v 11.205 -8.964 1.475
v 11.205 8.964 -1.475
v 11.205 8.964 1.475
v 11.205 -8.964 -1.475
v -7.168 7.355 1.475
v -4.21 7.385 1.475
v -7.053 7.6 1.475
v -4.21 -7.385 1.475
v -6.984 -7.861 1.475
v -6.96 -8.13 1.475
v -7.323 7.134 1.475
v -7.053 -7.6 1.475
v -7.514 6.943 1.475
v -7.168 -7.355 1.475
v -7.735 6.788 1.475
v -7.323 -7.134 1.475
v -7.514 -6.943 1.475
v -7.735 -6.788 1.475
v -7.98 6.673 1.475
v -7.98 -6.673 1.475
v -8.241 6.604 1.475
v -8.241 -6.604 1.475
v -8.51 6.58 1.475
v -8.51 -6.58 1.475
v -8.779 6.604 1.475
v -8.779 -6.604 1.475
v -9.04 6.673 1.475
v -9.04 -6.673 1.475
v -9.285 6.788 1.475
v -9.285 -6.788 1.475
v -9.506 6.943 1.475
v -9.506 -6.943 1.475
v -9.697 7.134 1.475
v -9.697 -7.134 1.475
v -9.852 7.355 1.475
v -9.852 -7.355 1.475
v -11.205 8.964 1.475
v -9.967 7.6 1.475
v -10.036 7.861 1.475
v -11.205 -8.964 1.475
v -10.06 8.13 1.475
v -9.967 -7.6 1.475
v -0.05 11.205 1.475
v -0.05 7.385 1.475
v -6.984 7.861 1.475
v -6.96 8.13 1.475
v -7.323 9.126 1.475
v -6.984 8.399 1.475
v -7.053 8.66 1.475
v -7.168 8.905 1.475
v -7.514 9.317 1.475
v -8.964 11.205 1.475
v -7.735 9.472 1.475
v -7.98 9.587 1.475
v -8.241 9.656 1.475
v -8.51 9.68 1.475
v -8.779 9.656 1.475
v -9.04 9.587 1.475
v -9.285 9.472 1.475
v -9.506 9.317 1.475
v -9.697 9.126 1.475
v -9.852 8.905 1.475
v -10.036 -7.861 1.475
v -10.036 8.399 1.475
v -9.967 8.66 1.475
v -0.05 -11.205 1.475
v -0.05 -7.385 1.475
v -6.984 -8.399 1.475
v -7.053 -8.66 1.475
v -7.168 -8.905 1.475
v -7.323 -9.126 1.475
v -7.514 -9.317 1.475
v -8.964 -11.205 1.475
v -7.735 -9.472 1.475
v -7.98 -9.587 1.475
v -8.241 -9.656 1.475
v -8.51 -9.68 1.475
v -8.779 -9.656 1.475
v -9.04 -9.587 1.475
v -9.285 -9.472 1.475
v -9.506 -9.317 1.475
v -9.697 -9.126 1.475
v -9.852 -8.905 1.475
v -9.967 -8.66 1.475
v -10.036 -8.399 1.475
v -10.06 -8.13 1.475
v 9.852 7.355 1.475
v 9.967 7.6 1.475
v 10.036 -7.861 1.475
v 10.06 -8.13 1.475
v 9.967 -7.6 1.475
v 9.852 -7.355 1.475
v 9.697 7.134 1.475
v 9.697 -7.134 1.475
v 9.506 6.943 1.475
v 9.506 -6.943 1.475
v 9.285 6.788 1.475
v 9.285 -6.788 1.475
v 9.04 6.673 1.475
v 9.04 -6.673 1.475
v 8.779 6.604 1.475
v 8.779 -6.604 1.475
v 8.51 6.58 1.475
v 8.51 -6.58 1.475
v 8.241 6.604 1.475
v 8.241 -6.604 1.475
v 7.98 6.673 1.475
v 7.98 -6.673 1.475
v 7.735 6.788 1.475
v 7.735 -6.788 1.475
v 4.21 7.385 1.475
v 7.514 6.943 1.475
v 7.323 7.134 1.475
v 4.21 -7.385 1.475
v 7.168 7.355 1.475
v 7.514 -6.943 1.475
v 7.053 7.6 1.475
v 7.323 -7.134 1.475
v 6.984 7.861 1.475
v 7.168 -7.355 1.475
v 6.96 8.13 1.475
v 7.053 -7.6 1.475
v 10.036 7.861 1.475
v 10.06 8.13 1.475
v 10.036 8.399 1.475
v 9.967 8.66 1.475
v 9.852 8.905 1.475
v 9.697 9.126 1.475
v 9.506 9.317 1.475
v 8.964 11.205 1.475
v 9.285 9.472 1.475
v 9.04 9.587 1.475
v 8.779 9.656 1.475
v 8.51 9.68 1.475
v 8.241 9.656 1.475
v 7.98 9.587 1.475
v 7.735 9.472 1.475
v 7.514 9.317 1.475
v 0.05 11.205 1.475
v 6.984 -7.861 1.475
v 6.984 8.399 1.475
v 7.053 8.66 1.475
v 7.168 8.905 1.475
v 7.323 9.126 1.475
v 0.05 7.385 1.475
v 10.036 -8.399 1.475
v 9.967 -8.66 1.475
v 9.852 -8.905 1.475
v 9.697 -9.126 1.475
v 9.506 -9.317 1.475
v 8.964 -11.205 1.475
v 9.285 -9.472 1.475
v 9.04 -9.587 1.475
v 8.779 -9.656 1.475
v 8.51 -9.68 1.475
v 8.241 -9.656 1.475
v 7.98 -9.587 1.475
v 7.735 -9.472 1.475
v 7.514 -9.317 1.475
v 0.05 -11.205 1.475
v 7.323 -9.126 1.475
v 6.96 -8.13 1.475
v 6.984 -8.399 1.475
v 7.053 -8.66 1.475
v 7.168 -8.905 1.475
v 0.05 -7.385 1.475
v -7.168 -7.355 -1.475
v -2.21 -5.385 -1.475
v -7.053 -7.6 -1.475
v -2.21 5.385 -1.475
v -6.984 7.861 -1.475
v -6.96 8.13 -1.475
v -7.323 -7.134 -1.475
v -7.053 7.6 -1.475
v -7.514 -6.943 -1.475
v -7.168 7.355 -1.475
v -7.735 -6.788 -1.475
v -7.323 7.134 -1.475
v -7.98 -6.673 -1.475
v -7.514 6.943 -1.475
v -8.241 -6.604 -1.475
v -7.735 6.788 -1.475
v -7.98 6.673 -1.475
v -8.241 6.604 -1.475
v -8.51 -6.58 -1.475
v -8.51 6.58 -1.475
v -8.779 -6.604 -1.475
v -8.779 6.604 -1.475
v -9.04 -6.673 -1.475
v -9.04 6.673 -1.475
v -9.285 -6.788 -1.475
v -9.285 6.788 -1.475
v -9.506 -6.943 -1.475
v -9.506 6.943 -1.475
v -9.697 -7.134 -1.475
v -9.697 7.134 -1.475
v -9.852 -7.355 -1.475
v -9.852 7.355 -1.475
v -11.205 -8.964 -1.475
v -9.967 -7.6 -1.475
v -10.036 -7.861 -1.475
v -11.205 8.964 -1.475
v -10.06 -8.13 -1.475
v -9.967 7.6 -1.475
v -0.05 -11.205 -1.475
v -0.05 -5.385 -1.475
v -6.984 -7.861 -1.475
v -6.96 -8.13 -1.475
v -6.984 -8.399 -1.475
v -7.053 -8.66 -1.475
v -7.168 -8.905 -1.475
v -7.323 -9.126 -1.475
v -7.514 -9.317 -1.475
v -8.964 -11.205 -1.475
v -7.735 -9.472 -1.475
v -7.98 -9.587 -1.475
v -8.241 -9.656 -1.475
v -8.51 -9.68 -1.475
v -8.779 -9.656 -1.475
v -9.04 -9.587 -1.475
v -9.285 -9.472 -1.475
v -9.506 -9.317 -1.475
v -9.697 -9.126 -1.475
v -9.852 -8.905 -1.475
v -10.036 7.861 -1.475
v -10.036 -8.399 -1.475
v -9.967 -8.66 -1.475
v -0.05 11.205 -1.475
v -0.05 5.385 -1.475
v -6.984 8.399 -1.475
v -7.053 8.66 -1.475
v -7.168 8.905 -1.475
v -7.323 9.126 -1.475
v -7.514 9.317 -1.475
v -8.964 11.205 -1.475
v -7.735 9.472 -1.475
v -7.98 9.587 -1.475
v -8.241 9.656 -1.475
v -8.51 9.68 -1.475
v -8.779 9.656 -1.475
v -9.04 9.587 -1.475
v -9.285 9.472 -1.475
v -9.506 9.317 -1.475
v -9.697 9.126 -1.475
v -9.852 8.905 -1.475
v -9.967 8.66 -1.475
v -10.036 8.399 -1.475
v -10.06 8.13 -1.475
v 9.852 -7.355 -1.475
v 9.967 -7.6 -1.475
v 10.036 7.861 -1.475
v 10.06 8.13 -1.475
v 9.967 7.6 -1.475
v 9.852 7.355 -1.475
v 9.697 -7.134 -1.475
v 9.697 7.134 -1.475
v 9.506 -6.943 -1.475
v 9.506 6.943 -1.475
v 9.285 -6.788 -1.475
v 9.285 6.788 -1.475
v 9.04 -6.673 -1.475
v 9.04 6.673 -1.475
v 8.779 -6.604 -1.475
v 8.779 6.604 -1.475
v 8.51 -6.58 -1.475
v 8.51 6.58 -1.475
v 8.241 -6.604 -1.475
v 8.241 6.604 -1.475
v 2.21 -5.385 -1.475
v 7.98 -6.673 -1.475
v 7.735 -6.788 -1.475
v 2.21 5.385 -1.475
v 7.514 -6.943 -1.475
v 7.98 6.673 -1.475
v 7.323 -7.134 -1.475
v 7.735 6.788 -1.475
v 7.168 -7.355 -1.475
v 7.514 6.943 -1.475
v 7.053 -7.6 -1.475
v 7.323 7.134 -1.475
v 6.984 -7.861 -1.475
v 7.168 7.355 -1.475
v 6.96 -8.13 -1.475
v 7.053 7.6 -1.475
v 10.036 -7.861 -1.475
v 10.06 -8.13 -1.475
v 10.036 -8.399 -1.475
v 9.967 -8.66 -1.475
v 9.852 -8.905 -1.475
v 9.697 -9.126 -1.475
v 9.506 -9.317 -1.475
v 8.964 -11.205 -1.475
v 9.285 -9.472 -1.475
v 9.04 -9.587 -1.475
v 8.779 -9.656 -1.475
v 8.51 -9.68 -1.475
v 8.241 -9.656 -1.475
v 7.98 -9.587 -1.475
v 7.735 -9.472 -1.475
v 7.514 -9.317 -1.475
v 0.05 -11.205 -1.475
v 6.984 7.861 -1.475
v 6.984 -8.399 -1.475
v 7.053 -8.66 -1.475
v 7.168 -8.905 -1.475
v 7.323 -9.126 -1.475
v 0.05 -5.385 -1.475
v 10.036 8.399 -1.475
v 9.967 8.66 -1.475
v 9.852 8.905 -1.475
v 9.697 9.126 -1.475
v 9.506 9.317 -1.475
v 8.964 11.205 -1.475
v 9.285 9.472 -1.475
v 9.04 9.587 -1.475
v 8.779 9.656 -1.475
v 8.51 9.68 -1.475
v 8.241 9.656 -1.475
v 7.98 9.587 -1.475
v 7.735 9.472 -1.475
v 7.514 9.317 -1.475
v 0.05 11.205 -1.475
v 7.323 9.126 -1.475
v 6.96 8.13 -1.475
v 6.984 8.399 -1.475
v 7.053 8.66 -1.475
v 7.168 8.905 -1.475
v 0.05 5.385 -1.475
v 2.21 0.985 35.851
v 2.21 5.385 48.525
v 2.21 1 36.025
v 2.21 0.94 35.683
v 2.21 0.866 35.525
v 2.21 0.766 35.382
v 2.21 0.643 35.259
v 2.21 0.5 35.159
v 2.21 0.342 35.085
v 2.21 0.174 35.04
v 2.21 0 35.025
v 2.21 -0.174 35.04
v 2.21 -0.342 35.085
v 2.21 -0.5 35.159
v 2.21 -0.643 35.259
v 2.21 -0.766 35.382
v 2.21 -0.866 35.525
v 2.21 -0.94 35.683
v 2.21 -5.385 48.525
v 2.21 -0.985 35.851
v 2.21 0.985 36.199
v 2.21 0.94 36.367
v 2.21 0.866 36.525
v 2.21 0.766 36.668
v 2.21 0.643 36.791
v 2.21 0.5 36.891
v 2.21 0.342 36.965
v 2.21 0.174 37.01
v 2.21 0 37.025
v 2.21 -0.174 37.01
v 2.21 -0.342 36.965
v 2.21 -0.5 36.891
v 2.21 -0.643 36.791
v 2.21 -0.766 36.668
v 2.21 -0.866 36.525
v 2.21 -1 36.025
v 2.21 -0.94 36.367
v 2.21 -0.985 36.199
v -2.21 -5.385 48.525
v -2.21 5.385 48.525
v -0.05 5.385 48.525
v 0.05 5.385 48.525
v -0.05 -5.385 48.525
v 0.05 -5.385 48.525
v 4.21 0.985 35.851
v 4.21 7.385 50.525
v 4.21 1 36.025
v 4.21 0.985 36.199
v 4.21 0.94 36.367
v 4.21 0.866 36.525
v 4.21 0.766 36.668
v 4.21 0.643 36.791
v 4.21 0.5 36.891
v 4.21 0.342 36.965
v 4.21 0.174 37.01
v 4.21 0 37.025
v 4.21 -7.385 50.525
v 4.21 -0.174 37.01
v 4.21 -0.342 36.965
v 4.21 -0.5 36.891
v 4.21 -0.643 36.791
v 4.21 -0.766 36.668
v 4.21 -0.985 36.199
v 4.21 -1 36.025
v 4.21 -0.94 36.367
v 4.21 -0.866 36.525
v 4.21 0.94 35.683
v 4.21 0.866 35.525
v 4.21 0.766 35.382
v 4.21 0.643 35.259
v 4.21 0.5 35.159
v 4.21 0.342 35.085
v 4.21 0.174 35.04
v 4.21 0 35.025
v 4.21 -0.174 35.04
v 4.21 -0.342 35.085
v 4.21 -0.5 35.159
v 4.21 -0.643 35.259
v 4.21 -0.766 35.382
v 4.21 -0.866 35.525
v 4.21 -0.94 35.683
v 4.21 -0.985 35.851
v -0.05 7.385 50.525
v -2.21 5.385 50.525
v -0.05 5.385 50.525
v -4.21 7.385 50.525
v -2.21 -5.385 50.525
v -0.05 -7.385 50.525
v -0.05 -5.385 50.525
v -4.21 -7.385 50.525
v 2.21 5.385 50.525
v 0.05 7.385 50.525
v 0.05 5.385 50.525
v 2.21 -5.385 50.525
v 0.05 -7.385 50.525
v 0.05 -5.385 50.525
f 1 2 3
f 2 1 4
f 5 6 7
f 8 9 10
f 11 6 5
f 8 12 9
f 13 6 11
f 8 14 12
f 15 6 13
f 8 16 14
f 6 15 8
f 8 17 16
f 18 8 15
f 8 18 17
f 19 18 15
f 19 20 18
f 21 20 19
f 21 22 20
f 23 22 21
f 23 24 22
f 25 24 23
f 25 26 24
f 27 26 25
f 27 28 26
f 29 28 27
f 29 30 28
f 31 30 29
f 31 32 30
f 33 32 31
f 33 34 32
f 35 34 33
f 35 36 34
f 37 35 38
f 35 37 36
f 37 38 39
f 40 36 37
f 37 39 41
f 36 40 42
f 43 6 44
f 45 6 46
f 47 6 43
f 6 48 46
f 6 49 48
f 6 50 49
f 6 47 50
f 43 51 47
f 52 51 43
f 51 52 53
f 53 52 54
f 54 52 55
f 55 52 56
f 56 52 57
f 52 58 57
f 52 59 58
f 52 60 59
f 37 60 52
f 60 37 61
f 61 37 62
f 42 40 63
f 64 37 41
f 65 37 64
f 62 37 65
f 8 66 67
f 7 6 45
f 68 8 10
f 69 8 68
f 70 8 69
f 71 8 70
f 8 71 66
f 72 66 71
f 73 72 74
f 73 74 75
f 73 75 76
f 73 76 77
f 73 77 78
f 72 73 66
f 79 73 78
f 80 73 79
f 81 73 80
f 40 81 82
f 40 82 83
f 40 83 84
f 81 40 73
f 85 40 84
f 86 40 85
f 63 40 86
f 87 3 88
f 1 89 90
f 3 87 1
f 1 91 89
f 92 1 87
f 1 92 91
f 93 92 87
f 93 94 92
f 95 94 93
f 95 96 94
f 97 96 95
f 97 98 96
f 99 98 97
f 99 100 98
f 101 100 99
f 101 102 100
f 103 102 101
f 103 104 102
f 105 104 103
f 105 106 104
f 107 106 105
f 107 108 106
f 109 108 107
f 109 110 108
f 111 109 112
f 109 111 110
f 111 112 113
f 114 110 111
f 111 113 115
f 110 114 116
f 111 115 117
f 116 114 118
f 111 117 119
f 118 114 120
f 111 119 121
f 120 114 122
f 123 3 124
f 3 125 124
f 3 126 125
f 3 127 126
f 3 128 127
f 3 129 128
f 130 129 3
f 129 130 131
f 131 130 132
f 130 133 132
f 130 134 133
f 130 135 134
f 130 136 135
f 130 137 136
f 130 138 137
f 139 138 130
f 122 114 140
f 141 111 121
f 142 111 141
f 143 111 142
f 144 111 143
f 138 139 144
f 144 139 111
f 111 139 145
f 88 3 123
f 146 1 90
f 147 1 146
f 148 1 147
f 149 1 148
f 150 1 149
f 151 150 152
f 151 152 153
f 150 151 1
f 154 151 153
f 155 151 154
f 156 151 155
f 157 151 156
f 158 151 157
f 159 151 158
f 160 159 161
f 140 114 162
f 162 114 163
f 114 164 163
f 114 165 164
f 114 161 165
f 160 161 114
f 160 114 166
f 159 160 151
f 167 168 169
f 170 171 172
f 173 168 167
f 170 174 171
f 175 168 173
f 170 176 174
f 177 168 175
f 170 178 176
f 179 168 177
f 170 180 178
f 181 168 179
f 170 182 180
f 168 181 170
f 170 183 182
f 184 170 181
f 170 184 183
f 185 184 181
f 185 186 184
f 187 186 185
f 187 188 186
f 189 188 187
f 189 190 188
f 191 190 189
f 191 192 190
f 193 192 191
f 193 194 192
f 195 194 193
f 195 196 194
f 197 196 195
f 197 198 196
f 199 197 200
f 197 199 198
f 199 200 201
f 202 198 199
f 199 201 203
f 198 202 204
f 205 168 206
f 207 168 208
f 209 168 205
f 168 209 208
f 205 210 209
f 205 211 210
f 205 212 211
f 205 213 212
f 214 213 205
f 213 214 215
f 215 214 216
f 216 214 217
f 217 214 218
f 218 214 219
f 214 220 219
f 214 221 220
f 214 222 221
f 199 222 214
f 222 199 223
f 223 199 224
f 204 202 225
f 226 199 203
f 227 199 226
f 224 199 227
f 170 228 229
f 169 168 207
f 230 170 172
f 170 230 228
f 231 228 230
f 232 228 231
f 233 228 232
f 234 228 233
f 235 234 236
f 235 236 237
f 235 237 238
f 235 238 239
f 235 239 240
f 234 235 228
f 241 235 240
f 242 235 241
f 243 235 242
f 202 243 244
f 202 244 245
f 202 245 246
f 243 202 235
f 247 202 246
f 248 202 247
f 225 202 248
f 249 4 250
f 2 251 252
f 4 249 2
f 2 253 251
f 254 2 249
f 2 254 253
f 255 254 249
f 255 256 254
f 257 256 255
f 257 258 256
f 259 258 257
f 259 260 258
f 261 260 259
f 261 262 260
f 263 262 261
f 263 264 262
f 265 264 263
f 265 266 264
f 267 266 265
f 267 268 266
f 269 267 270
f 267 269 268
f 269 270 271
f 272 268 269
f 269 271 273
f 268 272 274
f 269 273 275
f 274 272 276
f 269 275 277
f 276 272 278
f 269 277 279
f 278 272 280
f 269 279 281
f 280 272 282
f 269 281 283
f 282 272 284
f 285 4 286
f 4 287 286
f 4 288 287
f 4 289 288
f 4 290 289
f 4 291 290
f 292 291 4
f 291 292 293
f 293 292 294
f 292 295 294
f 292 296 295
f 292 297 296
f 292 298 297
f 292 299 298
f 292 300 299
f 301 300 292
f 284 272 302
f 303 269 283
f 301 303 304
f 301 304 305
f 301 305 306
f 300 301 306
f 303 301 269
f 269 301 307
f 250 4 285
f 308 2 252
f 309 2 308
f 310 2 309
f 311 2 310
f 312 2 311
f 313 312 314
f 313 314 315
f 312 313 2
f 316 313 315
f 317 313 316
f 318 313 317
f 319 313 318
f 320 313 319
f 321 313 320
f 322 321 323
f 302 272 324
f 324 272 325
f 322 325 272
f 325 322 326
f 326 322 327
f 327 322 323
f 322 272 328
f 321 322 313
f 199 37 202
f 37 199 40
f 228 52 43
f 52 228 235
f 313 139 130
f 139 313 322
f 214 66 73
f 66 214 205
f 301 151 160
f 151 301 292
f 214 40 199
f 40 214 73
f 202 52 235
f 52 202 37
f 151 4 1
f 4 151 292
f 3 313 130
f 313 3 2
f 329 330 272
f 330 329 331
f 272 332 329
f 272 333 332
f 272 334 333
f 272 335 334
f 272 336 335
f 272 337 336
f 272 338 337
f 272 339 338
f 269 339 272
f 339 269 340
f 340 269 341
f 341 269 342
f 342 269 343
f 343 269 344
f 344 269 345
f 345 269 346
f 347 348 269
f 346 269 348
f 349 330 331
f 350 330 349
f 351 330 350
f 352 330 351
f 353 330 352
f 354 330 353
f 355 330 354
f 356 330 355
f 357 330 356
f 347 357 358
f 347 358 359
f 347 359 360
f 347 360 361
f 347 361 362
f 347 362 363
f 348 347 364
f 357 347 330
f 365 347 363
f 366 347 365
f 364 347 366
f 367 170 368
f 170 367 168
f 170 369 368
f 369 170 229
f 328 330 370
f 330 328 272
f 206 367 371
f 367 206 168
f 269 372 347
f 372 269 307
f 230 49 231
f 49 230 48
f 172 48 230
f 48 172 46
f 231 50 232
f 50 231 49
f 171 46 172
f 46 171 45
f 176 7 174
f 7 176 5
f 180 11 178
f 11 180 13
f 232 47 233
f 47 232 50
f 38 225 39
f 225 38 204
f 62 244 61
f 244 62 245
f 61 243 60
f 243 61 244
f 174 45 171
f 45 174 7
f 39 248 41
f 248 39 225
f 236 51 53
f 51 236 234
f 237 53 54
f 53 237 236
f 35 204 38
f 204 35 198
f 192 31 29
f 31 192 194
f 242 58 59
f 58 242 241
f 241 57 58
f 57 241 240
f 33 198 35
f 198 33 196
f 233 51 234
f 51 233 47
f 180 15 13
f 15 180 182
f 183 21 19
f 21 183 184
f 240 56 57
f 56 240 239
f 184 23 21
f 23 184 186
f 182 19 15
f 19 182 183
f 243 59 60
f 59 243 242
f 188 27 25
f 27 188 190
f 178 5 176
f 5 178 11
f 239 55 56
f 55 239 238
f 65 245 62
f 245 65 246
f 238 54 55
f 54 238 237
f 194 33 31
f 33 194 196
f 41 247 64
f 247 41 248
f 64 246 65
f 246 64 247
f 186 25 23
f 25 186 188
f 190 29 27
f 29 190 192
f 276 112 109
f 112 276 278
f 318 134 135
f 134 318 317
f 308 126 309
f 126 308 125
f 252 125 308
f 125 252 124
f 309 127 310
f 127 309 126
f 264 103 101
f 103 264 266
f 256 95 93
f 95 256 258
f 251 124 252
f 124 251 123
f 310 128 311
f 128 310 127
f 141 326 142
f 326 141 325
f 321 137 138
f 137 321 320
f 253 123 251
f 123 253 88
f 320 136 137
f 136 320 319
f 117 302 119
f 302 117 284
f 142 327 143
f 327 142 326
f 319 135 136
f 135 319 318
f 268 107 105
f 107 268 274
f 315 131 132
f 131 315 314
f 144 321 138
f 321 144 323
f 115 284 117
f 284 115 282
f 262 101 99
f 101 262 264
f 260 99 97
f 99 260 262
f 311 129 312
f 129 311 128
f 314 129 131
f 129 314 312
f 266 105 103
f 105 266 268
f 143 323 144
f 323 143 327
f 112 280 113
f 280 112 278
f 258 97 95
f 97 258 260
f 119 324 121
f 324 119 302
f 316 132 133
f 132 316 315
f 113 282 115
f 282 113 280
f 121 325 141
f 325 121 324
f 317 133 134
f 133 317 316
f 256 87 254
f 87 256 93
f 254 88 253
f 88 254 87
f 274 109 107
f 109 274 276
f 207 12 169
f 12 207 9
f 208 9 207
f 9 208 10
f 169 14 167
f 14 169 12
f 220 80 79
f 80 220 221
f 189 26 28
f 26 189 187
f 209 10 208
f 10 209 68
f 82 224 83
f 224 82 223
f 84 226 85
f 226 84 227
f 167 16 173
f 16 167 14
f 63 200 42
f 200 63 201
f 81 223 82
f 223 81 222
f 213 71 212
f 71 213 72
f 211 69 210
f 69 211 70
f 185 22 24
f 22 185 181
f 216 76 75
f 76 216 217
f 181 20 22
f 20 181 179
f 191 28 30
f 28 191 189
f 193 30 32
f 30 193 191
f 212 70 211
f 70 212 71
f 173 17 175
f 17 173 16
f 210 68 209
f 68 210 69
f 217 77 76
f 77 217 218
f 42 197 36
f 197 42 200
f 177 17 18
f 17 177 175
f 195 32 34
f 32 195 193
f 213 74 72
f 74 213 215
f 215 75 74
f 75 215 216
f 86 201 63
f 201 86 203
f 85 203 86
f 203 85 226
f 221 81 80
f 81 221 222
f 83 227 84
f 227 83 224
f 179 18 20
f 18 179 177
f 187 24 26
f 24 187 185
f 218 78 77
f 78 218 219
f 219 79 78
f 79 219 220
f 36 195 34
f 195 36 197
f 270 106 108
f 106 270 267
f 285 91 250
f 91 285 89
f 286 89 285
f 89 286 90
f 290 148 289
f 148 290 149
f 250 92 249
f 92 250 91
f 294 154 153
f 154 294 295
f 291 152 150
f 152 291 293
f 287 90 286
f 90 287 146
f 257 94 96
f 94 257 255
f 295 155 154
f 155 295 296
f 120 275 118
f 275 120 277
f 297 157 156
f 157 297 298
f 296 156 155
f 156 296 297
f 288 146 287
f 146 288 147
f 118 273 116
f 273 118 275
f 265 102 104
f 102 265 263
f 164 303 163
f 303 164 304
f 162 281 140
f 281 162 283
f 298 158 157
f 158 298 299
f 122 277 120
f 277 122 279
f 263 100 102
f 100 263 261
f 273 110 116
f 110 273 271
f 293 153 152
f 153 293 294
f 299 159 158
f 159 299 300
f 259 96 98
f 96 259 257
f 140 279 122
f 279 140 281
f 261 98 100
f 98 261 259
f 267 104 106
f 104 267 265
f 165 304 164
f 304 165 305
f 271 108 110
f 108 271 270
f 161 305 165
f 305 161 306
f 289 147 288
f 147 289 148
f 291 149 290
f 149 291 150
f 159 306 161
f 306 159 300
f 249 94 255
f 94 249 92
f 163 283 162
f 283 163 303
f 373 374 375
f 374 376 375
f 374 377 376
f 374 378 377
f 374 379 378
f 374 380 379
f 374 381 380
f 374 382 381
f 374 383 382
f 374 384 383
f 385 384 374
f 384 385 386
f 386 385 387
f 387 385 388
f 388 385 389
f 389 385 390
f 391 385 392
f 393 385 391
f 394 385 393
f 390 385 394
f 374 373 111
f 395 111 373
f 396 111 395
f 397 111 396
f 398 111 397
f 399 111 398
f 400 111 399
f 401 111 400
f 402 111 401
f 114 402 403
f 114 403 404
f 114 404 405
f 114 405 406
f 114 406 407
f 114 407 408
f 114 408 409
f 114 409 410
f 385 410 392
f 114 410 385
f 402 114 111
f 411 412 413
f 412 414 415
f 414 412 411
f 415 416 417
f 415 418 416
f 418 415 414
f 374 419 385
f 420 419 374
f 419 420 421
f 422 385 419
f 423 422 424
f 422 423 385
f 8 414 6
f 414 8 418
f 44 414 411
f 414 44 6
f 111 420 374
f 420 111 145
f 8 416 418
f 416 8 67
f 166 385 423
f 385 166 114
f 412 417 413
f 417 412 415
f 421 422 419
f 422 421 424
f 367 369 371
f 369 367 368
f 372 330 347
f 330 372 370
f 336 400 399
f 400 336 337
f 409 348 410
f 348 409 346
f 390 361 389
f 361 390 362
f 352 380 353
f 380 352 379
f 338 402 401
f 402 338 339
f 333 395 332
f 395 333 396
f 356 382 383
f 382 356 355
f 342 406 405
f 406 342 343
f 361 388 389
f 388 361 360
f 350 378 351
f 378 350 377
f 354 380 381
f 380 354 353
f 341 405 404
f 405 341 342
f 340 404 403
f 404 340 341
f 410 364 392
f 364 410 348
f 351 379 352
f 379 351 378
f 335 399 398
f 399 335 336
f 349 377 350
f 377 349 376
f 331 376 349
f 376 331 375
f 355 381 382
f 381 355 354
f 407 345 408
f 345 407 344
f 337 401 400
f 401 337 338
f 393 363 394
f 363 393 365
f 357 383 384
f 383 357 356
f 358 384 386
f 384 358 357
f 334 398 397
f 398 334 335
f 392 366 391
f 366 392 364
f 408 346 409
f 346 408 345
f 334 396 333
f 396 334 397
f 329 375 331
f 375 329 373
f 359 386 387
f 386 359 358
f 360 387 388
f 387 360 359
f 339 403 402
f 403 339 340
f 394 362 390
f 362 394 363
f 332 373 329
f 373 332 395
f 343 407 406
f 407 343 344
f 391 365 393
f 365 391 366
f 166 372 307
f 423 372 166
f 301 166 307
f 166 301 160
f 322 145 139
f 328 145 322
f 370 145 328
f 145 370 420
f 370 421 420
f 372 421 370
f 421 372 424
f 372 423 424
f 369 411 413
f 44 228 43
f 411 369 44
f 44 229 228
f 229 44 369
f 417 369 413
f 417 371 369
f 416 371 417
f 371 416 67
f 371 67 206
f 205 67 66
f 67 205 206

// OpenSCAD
// file: common.scad
/**********************************************************************
 * Common waveguide code                                              *
 * NOTE: Must be included AFTER setting waveguide parameters          *
 * Perhaps in the future it could be useful to allow passing in these *
 * parameters to the modules themselves, removing this requirement.   *
 **********************************************************************/


/*             WR112   WR90   WR75   WR62   WR51   WR42   WR34  WR28 */
wrtab    = [0, 112,    90,    75,    62,    51,    42,    34,   28   ]*1.0; /* Waveguide type */
fstab    = [0,  47.9,  41.4,  38.3,  33.3,  31.0,  22.41, 22.1, 19.05]*1.0; /* Flange size */
fhstab   = [0,  18.72, 16.26, 14.25, 12.14, 11.25,  8.51,  7.9,  6.73]*1.0; /* Hole spacing short side */
fhltab   = [0,  17.17, 15.49, 13.21, 12.63, 10.29,  8.13,  7.5,  6.34]*1.0; /* Hole spacing long side */
drilltab = [0,   4.3,   4.3,   4.1,   4.1,   4.1,   3.1,   3.1,  3.0 ]*1.0; /* Hole size */
/* Not all waveguide opening sizes correspong 100% to the waveguide number */
wgatab   = [0,  28.50, 22.86, 19.05, 15.80, 12.95, 10.67,  8.64, 7.11]*1.0; /* Waveguide opening size A */
wgbtab   = [0,  12.62, 10.16,  9.53,  7.90,  6.48,  4.32,  4.32, 3.56]*1.0; /* Waveguide opening size B */


flange_size   = fstab[wrcode];        /* Square size of flange */
flange_hole_s = fhstab[wrcode];       /* Hole spacing on short side */
flange_hole_l = fhltab[wrcode];       /* Hole spacing on long side */
flange_drill  = drilltab[wrcode]/2.0; /* Flange mounting hole size */

wgsize_a = wgatab[wrcode] + (trim * 2);
wgsize_b = wgbtab[wrcode] + (trim * 2);

// faces for precision
$fn=36; // faces for precision

/* Create a waveguide flange
 *   Heavily based on code from Rolf-Dieter Klein (www.rdklein.de)
 *   https://www.thingiverse.com/thing:161428
 */
module flange() {
    thickness = flanged - trim;

    difference() {
        difference() {
            intersection() {
                cube([flange_size, flange_size, thickness], center=true);
                rotate([0,0,45])
                    cube([flange_size*1.4142*0.9,flange_size*1.4142*0.9,thickness],center=true);
            }
            cube([wgsize_b,wgsize_a,wall*2],center=true);
        }
        /* Holes */
        translate([-flange_hole_s,  flange_hole_l, 0]) cylinder(h=thickness*1.1, r=flange_drill, center=true);
        translate([ flange_hole_s,  flange_hole_l, 0]) cylinder(h=thickness*1.1, r=flange_drill, center=true);
        translate([-flange_hole_s, -flange_hole_l, 0]) cylinder(h=thickness*1.1, r=flange_drill, center=true);
        translate([ flange_hole_s, -flange_hole_l, 0]) cylinder(h=thickness*1.1, r=flange_drill, center=true);
    }
}

/* Create a flangeless section of waveguide
 *   wg_len: Length of section, in mm
 */
module waveguide(wg_len) {
    translate([0,0,wg_len/2]) {
        difference() {
            cube([wgsize_b+wall*2, wgsize_a+wall*2, wg_len],          center=true);
            cube([wgsize_b,        wgsize_a,        wg_len + wall*.1],center=true);
        }
    }
}

/* Generate horn antenna
 *   length:  Length of horn
 *   theta_h: Angle of horn in magnetic field
 *   theta_e: Angle of horn in electric field
 *
 * Polyhedron code loosely based off of code from Rolf-Dieter Klein (www.rdklein.de)
 *   https://www.thingiverse.com/thing:161428
 */
module horn(length, theta_h, theta_e) {
    /* Depth of horn that ends up inside waveguide */
    d_a = wgsize_a / (2 * tan(theta_h));
    d_b = wgsize_b / (2 * tan(theta_e));

    /* Size of horn opening */
    sz_a = wgsize_a + (2 * length * tan(theta_h));
    sz_b = wgsize_b + (2 * length * tan(theta_e));

    difference() {
        polyhedron(
            points = [
                /* Wide end */
                [ sz_b/2 + wall,  sz_a/2 + wall, length],
                [ sz_b/2 + wall, -sz_a/2 - wall, length],
                [-sz_b/2 - wall, -sz_a/2 - wall, length],
                [-sz_b/2 - wall,  sz_a/2 + wall, length],
                /* Small end */
                [ wgsize_b/2 + wall,  wgsize_a/2 + wall, 0],
                [ wgsize_b/2 + wall, -wgsize_a/2 - wall, 0],
                [-wgsize_b/2 - wall, -wgsize_a/2 - wall, 0],
                [-wgsize_b/2 - wall,  wgsize_a/2 + wall, 0]
            ],
            faces = [
                [0,1,4],[1,2,5],[2,3,6],[3,0,7],
                [1,5,4],[2,6,5],[3,7,6],[0,4,7],
                [1,0,3],[2,1,3],[4,5,7],[5,6,7]
            ]
        );
        polyhedron(
            points = [
                /* Wide end */
                [ sz_b/2,  sz_a/2, length],
                [ sz_b/2, -sz_a/2, length],
                [-sz_b/2, -sz_a/2, length],
                [-sz_b/2,  sz_a/2, length],
                /* Small end */
                [ wgsize_b/2,  wgsize_a/2, 0],
                [ wgsize_b/2, -wgsize_a/2, 0],
                [-wgsize_b/2, -wgsize_a/2, 0],
                [-wgsize_b/2,  wgsize_a/2, 0]
            ],
            faces = [
                [0,1,4],[1,2,5],[2,3,6],[3,0,7],
                [1,5,4],[2,6,5],[3,7,6],[0,4,7],
                [1,0,3],[2,1,3],[4,5,7],[5,6,7]
            ]
        );
    }
}

/* Generate an ideal horn antenna for a given wavelength
 *   l_h: Length of horn in magnetic field direction
 *   l_e: Length of horn in electric field direction
 *   wavelength: Design wavelength
 *
 * Both l_h and l_e include the portion of the antenna that would end up inside
 * the waveguide if both sides of the horn were extended until they meet.
 */
module ideal_horn(l_h, l_e, wavelength) {
    theta_e = asin(sqrt(2 * wavelength * l_e) / (2 * l_e));
    theta_h = asin(sqrt(3 * wavelength * l_h) / (2 * l_h));

    /* Not sure if min is good, but whatever. Maybe I should rewrite this to just produce the horn directly */
    length_e = (l_e * cos(theta_e)) - (wgsize_b / (2 * tan(theta_e)));
    length_h = (l_h * cos(theta_h)) - (wgsize_a / (2 * tan(theta_h)));
    echo("Len_E: ", length_e, "Len_H", length_h);
    length = min(length_e, length_h);

    horn(length, theta_h, theta_e);
}
// main file
/*************************************************
 * Waveguide-to-coax transition generator        *
 *  Only E-field transitions currently supported *
 *************************************************/

/********************
 * Variables/Inputs *
 ********************/

/* Waveguide selection */
wrcode = 6;

/* Waveguide wall thickness */
wall = 2;

/* Flange thickness */
flanged = 3;

/* Length of transition, including flange, not including thickness of shorting wall. */
length = 50;

/* Radius of hole for probe into waveguide, including dilectric */
probe_hole_r = 1;
/* Distance of probe hole from back wall */
probe_dist   = 12.5;
/* Offset of probe hole from center */
probe_offset = 0;

/* Distance of mounting holes from center of probe hole */
coax_mount_dist  = 4;
/* Radius of coax connector mounting holes */
coax_mount_r     = 1;
/* Number of coax connector mounting holes - holes are assumed to be equal angles from eachother */
coax_mount_n     = 0;
/* Start angle for first mount point */
coax_mount_angle = 45;



/* Amount to trim back internal and mating surfaces, for the purpose of accounting for metallic tape or coating. */
trim = 0.05;

/* Set to 1 to split waveguide along short side of section. This can make coating inside of waveguide much easier. */
split_part = 1;



/******************************************************************************/

/* Import waveguide components */
include <common.scad>

difference() {
    union() {
        flange();
        translate([0, 0, length - ((flanged - trim) / 2) + (wall / 2)]) {
            cube([wgbtab[wrcode] + (wall / 2), wgatab[wrcode] + (wall / 2), wall], center=true);
        }

        waveguide(length - ((flanged - trim) / 2) + wall);
    }

    translate ([(wgbtab[wrcode] + wall)/2, probe_offset, length - probe_dist - ((flanged - trim) / 2)]) {
        rotate([0, 90, 0]) {
            cylinder(h = wall*1.1, r=probe_hole_r, center=true);

            if(coax_mount_n) {
                for(i = [0:coax_mount_n]) {
                    rotate([0, 0, coax_mount_angle + i * (360 / coax_mount_n)]) {
                        translate([coax_mount_dist, 0, 0]) {
                            cylinder(h=wall*10, r=coax_mount_r, center=true);
                        }
                    }
                }
            }
        }
    }

    if(split_part) {
        translate([-trim, -wgsize_a*2, -flanged])
            cube([trim * 2, wgsize_a*4, length*1.5]);
    }
}
